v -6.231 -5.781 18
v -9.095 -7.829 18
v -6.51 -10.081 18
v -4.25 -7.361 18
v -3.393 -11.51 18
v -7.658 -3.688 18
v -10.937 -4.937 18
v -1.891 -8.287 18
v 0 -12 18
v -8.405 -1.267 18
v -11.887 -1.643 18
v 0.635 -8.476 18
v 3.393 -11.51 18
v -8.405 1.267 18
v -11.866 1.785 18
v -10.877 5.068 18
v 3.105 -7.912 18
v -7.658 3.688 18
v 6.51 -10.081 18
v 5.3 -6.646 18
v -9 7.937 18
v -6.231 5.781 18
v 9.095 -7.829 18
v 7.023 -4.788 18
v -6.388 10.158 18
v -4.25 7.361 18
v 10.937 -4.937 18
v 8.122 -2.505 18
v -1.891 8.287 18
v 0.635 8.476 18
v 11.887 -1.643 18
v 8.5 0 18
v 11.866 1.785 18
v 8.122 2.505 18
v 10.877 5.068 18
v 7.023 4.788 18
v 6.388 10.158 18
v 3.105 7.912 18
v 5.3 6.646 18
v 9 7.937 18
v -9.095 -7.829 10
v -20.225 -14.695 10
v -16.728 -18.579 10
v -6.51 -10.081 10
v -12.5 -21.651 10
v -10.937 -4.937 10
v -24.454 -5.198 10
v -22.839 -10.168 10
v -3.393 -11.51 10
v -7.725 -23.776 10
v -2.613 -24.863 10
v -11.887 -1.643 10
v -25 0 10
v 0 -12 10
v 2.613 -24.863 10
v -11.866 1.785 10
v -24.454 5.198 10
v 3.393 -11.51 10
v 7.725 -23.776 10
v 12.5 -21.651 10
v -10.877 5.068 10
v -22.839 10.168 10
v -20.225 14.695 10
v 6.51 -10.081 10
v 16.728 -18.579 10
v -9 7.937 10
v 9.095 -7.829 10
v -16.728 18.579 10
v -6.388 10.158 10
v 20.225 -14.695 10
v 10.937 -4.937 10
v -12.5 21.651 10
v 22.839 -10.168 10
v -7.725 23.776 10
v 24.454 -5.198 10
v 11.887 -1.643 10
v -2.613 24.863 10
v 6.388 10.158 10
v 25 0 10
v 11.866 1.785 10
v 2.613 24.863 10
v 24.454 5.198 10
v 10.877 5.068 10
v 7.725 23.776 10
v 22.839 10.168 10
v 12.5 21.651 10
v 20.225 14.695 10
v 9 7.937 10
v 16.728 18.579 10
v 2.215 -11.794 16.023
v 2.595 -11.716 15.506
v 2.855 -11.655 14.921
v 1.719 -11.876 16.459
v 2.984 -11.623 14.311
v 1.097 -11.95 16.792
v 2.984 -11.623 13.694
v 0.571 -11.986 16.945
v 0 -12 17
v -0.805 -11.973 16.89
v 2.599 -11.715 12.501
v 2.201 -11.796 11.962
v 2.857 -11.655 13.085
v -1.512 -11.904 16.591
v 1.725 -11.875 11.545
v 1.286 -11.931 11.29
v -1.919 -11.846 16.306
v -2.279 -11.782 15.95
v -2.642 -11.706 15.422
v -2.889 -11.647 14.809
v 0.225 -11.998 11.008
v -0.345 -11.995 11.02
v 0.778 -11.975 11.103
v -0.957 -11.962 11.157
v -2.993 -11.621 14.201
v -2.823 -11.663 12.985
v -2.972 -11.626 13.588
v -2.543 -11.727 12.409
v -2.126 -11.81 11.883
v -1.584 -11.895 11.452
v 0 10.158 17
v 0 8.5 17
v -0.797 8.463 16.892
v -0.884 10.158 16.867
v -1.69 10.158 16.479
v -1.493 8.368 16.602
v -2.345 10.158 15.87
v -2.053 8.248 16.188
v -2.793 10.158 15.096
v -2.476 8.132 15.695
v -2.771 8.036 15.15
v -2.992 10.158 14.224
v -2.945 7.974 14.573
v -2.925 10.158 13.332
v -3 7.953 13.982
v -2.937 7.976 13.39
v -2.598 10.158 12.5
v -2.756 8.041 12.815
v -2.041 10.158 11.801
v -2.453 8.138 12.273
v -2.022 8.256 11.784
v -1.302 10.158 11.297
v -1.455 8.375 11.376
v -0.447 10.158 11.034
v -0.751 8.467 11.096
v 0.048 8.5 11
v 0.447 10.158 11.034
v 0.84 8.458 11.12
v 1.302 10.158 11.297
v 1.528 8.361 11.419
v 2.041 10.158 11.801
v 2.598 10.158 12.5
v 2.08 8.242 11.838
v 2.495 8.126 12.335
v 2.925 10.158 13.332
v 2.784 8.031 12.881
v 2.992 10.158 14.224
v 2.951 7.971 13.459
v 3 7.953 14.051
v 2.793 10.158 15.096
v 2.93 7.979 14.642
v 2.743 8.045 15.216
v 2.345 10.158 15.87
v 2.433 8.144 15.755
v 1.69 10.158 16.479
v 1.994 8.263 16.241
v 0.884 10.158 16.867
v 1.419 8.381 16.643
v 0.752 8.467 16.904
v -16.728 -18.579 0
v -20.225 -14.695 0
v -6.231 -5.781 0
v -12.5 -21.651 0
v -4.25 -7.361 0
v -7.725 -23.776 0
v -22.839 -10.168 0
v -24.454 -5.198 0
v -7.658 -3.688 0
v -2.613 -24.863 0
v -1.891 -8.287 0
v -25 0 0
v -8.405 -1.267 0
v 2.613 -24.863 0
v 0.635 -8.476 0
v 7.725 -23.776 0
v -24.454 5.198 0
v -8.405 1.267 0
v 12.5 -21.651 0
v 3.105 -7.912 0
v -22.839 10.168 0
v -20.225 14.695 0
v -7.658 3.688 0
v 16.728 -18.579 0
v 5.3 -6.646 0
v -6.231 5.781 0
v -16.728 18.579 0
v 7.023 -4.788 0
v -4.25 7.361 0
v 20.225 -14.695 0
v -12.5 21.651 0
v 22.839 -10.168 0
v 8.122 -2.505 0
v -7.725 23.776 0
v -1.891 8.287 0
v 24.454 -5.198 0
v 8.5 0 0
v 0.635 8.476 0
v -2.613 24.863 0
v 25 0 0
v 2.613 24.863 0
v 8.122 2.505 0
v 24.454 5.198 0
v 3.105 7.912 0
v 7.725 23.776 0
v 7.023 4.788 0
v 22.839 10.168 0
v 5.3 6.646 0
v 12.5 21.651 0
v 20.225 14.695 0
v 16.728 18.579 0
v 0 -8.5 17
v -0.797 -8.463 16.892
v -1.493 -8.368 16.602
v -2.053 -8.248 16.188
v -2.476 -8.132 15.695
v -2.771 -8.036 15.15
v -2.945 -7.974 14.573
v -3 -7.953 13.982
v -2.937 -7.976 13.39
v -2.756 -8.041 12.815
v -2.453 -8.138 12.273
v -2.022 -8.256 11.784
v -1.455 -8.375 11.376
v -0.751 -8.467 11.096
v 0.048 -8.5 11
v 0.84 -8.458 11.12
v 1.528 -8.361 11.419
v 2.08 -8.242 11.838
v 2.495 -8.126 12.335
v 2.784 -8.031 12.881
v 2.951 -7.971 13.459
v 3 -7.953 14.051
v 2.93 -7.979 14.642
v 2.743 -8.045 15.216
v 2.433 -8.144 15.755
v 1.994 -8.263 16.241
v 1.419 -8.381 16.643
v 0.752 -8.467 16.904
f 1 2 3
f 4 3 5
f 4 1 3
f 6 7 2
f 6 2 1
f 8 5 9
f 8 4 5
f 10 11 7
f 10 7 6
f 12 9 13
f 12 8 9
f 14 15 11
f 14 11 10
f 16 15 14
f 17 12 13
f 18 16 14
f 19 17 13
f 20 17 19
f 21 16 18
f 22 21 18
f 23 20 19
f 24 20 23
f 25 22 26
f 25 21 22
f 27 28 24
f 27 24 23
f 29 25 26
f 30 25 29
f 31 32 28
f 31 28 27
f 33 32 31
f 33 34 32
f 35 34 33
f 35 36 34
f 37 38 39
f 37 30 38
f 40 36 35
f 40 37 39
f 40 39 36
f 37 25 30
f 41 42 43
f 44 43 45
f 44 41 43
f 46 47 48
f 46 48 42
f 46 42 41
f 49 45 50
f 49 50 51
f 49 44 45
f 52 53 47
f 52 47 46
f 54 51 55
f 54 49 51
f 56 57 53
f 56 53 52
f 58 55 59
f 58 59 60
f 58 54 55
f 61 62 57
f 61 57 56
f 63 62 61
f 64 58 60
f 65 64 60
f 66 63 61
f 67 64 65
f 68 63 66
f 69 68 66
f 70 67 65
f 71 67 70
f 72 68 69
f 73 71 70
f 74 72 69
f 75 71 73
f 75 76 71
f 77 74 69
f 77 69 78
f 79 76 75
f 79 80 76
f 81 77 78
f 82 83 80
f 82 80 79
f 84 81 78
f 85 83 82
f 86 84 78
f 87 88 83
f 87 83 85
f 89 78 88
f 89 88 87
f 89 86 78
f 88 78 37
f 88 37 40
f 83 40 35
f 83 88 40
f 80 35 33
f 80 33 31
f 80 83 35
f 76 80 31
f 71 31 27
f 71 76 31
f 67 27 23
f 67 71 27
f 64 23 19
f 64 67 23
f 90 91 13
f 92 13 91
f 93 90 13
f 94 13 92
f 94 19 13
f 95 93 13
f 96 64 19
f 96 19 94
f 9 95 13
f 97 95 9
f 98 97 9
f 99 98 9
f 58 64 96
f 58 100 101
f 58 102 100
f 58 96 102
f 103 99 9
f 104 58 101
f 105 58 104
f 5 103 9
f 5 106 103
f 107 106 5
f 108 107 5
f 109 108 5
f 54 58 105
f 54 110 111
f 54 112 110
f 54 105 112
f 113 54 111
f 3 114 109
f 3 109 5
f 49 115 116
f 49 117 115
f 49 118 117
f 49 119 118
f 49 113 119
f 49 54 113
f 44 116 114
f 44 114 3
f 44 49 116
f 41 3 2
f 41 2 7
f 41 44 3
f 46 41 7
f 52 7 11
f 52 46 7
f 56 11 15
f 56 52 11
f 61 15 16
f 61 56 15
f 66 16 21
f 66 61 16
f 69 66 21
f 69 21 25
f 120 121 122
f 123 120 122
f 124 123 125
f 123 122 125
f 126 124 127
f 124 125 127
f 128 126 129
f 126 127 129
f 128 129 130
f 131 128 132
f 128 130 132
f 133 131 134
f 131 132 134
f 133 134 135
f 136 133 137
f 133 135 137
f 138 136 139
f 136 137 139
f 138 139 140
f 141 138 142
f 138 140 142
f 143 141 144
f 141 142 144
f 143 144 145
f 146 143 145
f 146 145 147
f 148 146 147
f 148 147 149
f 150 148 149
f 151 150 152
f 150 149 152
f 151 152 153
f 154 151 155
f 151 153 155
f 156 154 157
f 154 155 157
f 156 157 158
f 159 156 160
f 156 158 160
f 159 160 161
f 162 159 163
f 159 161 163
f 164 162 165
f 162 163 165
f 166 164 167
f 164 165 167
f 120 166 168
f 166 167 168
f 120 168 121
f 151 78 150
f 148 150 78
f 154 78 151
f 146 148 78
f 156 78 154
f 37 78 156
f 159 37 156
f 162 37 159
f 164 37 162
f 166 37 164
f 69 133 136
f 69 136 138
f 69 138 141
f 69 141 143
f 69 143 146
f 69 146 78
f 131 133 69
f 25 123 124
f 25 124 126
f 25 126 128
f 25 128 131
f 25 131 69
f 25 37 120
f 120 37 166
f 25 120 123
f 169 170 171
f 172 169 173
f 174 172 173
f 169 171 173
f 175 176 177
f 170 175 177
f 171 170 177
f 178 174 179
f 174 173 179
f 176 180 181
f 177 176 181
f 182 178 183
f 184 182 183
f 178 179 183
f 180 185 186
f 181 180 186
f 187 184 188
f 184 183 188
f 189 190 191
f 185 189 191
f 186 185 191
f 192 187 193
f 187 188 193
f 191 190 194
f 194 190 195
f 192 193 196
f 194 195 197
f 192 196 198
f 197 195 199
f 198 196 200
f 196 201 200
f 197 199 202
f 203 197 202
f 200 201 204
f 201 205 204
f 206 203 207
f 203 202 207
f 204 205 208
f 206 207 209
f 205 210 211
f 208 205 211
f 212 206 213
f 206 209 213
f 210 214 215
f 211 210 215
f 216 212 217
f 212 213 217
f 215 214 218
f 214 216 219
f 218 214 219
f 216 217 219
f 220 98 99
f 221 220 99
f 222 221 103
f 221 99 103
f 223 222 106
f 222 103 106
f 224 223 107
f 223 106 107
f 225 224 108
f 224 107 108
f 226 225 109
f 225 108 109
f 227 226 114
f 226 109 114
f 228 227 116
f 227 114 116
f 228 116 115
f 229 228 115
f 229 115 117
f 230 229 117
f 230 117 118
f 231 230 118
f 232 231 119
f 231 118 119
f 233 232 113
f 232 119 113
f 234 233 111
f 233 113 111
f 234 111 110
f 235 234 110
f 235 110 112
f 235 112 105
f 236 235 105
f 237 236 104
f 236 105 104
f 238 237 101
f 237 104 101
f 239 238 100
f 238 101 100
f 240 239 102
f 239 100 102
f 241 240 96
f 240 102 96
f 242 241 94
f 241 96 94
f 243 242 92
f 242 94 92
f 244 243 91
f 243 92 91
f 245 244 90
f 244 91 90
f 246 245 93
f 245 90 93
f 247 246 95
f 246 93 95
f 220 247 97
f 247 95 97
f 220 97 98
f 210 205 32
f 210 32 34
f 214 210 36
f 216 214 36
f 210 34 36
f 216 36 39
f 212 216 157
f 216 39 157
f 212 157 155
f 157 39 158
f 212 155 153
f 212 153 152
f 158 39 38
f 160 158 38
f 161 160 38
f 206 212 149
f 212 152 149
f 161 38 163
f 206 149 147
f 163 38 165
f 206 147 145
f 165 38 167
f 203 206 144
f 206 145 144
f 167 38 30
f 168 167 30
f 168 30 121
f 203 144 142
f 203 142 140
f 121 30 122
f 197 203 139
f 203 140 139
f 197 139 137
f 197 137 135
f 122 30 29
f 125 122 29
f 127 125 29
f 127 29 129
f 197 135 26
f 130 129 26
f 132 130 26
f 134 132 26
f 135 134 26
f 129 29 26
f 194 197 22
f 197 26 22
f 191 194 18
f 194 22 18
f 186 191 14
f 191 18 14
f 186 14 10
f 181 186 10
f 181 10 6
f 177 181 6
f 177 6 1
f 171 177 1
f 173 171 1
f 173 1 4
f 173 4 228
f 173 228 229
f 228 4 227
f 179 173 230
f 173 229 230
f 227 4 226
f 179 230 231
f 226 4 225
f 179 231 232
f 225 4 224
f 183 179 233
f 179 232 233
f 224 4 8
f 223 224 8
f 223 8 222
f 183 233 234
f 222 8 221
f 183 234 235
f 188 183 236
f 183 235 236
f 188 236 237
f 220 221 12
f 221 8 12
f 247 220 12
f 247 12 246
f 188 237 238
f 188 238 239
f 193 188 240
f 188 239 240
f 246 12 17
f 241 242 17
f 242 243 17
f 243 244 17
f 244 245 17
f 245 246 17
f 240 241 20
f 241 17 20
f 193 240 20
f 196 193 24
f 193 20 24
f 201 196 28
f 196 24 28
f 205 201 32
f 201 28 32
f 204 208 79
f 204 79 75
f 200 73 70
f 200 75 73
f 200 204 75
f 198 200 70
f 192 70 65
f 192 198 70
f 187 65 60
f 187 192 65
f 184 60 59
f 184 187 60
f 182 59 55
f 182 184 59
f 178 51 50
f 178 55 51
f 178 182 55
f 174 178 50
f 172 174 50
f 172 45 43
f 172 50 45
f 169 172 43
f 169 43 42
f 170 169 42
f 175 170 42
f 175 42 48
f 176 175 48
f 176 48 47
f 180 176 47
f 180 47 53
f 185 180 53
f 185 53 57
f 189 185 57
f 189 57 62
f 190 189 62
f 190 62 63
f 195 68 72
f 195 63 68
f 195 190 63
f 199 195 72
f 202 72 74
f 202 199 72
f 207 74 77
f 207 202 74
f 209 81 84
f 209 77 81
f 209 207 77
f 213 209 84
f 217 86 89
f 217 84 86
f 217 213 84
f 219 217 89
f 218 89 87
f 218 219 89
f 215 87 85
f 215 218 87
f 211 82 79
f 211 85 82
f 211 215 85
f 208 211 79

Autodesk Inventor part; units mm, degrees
ref_plane "YZ Plane" through (0, 0, 0) normal (1, 0, 0) x (0, 1, 0)
ref_plane "XZ Plane" through (0, 0, 0) normal (0, 1, 0) x (-1, 0, 0)
ref_plane "XY Plane" through (0, 0, 0) normal (0, 0, 1) x (1, 0, 0)
sketch "Sketch3" plane through (0, 0, 0) normal (0, 0, 1) x (1, 0, 0)
  circle A0 centre (0, 0) radius 25
  circle A1 centre (0, 0) radius 8.5
  dimension "d8" = 50
  dimension "d16" = 17
extrude "Extrusion3" add sketch "Sketch3" along normal blind 10 contours A0 | A1
sketch "Sketch4" plane through (0, 0, 10) normal (0, 0, 1) x (1, 0, 0)
  circle A0 centre (0, 0) radius 12
  circle A1 centre (0, 0) radius 8.5
  dimension "d12" = 24
  dimension "d17" = 17
extrude "Extrusion4" add sketch "Sketch4" along normal blind 8 contours A0 | A1
sketch "Sketch5" plane through (0, 0, 10) normal (0, 0, 1) x (1, 0, 0)
  point P0 (0, 0)
sketch "Sketch6" plane through (0, 0, 18) normal (0, 0, 1) x (1, 0, 0)
  circle A0 centre (0, 0) radius 8.5
  dimension "d18" = 17
extrude "Extrusion5" cut sketch "Sketch6" against normal blind 30
sketch "Sketch7" plane through (0, 0, 18) normal (0, 0, 1) x (1, 0, 0)
  circle A0 centre (0, 0) radius 12 projected
  line L0 (6.3883, 10.1583) -> (-6.3883, 10.1583)
  arc A1 (6.3883, 10.1583) -> (-6.3883, 10.1583) centre (0, 0) ccw
  arc A2 (6.3883, 10.1583) -> (-6.3883, 10.1583) centre (0, 0) ccw
extrude "Extrusion6" cut sketch "Sketch7" against normal blind 8 contours L0 A0 picked at (-1.322, 10.5474)
sketch "Sketch8" plane through (-6.3883, 10.1583, 18) normal (0, 1, 0) x (1, 0, 0)
  point P0 (6.3883, 18)
  point P1 (6.3883, 4)
hole "Hole1" at (0, 10.1583, 14) direction (0, -1, 0) diameter 6 end through all
properties part number "Project_Stationary_Wheel[1]"
